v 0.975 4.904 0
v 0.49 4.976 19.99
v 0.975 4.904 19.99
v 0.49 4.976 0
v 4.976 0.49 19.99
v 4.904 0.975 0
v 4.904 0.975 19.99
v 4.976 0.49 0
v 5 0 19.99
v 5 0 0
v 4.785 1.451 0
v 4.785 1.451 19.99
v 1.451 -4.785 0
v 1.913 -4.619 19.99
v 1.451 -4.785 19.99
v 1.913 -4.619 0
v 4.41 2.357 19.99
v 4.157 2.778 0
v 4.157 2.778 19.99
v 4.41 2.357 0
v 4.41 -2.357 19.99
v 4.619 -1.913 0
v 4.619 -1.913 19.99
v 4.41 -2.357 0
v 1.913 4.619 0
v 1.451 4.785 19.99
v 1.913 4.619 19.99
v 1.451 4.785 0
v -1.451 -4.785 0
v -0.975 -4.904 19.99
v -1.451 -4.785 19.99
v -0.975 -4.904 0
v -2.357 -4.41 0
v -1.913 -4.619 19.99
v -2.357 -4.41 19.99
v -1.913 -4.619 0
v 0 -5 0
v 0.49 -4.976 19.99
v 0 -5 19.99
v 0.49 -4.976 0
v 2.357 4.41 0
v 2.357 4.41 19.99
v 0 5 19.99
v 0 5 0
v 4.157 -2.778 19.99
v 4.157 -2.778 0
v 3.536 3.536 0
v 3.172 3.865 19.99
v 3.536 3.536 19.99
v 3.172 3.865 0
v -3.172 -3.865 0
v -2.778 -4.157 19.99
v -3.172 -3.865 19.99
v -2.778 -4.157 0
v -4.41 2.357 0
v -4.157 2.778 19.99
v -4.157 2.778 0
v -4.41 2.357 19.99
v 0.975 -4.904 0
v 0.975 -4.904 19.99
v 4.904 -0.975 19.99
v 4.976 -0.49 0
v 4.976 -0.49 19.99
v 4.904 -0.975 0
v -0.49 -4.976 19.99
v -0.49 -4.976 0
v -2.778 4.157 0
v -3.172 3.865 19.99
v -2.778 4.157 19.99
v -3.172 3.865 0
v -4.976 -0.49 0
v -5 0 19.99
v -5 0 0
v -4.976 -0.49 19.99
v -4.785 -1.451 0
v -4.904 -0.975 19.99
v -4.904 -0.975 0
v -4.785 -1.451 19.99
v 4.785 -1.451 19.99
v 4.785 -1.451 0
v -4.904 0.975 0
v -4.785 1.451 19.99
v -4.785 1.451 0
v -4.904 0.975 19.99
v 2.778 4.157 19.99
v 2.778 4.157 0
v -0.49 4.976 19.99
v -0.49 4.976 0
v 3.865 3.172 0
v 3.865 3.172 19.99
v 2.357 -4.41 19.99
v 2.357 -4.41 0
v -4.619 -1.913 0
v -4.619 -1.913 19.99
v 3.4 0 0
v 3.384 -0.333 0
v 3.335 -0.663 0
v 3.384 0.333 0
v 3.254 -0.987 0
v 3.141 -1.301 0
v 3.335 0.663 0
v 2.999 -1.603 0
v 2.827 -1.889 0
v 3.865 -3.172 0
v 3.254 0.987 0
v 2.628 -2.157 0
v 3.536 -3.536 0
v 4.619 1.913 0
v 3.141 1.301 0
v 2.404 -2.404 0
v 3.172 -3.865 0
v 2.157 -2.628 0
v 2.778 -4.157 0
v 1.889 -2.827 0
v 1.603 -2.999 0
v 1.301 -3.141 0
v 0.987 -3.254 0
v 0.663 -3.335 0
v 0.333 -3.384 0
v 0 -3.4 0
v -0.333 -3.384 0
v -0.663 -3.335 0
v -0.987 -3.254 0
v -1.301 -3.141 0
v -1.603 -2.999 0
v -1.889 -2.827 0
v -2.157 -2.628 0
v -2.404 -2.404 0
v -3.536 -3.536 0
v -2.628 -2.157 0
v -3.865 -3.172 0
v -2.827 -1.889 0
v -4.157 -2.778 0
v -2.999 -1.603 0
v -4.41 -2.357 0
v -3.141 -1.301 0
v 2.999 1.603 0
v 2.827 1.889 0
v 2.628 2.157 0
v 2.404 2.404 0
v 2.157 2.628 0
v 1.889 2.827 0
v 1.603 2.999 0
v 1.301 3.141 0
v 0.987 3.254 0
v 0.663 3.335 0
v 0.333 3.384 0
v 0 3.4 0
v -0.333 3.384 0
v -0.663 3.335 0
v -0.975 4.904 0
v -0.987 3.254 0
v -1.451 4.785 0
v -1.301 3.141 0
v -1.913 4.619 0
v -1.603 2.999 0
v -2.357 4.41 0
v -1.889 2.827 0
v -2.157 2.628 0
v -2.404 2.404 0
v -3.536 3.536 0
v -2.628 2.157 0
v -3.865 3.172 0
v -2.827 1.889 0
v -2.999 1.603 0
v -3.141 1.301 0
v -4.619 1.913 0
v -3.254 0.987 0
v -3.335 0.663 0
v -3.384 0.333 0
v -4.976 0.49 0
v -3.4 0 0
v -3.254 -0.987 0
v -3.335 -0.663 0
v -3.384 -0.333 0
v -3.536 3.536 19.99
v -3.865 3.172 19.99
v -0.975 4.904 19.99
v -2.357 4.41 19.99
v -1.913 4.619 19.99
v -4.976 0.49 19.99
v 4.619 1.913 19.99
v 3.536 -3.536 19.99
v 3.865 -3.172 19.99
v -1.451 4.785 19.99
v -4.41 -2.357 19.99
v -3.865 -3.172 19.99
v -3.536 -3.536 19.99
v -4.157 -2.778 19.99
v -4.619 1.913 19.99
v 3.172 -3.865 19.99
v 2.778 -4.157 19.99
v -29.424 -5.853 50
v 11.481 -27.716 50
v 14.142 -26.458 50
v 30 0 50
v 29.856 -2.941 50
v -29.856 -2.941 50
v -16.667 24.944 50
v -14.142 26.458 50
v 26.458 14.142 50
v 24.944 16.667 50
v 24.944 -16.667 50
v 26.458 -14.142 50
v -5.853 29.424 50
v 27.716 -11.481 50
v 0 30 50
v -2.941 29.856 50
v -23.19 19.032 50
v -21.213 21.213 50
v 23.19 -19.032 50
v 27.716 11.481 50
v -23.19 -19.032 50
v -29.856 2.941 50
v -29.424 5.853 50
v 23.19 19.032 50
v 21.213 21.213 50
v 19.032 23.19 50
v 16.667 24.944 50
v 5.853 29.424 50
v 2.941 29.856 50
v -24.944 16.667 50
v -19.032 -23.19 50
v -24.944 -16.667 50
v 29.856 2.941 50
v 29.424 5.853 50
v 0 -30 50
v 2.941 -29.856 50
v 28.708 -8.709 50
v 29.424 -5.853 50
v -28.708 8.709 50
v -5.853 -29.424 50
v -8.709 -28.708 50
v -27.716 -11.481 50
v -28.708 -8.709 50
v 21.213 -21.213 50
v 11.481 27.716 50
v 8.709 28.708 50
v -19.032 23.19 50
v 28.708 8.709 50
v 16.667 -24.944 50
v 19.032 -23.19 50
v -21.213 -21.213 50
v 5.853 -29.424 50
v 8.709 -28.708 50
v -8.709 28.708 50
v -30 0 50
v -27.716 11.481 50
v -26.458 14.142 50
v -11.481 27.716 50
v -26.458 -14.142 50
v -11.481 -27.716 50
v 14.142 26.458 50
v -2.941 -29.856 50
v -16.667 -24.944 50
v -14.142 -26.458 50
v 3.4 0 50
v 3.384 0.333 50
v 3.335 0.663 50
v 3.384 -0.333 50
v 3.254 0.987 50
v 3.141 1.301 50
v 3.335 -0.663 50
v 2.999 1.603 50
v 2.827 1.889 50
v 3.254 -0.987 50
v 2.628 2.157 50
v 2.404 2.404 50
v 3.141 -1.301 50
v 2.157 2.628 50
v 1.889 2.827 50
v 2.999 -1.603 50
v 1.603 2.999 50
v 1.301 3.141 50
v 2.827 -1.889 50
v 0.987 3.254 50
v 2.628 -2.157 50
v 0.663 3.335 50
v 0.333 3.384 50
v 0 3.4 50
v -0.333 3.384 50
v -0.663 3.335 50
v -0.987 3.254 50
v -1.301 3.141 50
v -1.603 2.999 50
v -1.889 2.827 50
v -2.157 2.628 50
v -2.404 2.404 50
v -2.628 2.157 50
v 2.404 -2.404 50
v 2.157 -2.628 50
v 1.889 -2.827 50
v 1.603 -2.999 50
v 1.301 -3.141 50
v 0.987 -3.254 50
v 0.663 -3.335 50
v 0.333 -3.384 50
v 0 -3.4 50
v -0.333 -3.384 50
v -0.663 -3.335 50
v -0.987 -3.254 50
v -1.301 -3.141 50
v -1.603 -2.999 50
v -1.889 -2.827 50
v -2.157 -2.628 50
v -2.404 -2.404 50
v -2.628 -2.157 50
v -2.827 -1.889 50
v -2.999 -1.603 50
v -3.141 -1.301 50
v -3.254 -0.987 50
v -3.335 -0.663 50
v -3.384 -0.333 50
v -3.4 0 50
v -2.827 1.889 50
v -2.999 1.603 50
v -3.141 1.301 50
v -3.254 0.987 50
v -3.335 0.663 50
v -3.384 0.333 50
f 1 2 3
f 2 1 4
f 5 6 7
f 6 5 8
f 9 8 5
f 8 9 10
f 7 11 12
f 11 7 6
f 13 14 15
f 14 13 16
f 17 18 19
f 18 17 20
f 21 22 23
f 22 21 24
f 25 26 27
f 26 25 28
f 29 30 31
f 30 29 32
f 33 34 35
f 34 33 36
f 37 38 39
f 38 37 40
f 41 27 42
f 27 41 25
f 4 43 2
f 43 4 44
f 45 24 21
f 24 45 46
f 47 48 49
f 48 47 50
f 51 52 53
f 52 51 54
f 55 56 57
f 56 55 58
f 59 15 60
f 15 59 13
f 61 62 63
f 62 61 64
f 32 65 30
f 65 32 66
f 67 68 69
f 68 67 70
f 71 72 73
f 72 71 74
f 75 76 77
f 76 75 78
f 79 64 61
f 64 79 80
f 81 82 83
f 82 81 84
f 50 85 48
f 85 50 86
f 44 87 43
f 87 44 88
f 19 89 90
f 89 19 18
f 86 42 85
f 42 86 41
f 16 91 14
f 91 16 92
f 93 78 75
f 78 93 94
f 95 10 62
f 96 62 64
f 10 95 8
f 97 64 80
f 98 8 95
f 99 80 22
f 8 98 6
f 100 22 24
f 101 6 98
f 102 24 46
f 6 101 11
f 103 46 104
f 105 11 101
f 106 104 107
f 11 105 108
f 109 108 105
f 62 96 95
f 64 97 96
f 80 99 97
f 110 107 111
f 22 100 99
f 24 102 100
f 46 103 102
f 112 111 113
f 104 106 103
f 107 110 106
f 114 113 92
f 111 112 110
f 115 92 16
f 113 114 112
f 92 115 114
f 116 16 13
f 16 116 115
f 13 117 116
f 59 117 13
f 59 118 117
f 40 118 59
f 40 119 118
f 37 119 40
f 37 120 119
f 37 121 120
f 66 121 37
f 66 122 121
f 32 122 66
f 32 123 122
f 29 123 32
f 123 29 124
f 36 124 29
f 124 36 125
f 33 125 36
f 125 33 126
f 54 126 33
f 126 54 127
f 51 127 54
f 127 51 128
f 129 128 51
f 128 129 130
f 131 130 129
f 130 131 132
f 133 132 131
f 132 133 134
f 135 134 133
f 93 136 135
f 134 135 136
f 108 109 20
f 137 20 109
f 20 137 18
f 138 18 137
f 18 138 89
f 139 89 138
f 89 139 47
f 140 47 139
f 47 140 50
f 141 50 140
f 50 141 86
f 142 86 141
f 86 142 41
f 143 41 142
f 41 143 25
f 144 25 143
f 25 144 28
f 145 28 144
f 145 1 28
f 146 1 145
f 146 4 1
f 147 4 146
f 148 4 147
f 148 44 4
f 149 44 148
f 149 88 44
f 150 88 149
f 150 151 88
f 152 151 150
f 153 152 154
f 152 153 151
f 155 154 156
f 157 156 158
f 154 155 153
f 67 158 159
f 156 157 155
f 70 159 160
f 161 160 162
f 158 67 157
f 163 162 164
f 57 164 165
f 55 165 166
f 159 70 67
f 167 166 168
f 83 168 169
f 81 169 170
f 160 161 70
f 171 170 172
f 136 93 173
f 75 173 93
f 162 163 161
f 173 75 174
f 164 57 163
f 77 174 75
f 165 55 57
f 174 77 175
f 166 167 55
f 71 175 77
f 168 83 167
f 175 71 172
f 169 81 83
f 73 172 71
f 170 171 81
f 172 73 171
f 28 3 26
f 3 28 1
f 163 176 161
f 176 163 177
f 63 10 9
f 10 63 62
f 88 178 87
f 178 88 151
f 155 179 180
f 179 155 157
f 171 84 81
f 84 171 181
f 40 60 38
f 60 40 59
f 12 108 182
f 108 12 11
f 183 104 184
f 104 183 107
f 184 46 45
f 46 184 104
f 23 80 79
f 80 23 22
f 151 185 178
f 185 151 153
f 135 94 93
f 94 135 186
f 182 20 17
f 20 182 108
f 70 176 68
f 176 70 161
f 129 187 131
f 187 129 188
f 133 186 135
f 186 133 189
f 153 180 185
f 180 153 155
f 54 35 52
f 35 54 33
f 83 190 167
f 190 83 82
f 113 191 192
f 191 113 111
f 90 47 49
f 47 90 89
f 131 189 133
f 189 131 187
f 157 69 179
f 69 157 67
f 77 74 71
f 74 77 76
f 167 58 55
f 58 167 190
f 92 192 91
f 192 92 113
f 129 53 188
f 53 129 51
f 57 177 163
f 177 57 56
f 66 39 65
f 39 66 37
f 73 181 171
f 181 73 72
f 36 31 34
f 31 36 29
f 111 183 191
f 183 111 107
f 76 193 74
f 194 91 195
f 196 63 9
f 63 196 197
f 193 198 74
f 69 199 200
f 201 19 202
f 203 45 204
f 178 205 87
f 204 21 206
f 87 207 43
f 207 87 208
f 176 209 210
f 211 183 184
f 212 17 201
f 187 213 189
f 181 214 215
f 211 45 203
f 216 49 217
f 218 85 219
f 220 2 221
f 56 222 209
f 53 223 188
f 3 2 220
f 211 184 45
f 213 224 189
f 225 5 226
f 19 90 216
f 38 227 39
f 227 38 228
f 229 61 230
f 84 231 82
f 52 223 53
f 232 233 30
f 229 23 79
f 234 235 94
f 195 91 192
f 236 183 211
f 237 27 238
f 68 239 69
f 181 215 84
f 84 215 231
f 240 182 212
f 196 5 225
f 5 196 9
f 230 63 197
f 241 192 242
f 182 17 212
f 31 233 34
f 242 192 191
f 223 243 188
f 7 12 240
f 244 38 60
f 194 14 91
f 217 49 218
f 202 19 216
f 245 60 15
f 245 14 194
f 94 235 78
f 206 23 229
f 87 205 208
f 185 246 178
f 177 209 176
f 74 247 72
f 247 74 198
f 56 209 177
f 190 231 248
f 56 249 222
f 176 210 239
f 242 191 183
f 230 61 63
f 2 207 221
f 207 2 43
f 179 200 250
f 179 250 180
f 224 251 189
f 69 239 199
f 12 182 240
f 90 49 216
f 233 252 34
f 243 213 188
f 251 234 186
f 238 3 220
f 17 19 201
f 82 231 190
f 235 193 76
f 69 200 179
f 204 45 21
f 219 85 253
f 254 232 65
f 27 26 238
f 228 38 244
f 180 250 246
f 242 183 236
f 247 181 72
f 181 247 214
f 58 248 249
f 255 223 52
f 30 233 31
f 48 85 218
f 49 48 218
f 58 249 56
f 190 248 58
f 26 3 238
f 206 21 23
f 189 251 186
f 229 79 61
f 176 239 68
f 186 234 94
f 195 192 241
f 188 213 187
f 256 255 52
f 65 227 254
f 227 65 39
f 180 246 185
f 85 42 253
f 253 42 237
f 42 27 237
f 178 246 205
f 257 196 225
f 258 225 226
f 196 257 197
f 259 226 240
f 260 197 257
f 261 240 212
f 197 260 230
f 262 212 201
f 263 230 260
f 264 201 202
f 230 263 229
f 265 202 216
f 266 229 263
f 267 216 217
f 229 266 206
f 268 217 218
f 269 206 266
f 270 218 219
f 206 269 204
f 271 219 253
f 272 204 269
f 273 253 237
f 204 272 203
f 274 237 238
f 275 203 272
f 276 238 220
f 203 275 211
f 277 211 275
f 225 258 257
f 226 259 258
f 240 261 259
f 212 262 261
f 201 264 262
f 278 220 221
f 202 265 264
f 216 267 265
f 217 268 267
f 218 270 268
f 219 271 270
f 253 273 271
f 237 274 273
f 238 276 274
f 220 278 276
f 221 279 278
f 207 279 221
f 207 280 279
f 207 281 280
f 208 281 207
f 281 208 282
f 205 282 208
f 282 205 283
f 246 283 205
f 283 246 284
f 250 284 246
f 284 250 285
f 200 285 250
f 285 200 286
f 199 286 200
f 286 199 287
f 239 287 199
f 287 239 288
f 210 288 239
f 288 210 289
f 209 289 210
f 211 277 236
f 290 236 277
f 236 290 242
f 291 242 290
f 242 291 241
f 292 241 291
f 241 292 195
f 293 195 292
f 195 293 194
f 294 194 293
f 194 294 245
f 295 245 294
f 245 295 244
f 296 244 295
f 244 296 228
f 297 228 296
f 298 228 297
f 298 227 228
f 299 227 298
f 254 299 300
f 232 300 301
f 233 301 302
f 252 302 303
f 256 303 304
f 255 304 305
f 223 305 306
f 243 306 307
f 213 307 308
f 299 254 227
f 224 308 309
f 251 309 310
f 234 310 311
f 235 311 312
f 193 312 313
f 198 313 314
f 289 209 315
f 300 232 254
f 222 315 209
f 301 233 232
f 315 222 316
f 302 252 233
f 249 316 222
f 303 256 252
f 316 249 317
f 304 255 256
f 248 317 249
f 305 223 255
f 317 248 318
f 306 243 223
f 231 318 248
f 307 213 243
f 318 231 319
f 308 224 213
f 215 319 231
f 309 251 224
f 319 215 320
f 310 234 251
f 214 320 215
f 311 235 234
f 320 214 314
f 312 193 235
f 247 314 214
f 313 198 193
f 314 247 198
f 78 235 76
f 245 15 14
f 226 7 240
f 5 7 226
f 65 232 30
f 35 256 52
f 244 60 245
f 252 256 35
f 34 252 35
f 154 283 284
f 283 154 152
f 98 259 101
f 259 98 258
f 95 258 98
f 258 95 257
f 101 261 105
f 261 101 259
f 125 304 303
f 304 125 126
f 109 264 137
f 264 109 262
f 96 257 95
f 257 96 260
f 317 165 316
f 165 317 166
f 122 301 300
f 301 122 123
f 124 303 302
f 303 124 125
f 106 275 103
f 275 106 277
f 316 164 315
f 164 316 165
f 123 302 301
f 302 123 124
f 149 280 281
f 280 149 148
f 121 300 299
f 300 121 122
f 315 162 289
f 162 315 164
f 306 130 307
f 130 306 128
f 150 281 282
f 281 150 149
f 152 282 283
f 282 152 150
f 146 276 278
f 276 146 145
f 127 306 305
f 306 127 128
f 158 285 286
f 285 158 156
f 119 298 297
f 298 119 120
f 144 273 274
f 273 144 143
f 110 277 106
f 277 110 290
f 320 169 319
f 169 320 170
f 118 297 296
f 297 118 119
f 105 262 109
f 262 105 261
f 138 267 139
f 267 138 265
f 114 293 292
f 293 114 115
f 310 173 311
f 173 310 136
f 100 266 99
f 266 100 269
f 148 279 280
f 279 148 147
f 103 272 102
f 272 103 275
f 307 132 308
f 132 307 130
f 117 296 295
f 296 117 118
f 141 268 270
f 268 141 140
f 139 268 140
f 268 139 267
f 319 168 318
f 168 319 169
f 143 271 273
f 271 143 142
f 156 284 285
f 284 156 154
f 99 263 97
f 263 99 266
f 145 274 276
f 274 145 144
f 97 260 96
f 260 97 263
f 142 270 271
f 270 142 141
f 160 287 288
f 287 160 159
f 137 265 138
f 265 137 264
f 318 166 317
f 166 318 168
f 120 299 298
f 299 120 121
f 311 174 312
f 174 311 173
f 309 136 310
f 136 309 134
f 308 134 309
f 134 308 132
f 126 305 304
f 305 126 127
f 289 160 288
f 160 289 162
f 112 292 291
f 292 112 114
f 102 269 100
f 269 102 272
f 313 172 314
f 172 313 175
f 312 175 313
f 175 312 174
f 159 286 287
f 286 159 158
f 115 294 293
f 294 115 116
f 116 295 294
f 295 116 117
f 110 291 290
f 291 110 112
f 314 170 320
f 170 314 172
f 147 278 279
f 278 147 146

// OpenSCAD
// Lab funnel - printed upright, wide opening at top
// Units: mm

$fn = 64;

// --- Dimensions ---
spout_od      = 10;   // spout outer diameter
spout_h       = 20;   // spout height (z = 0 to 20)
spout_bore    = 6.8;  // spout bore (od 10, wall 1.6)

cone_od_bottom = 10;  // cone outer diameter at z = 20
cone_od_top    = 60;  // cone outer diameter at rim (z = 50)
cone_h        = 30;   // cone height (z = 20 to 50)

wall          = 1.6;  // wall thickness everywhere

// --- Derived ---
spout_r_out   = spout_od / 2;
spout_r_in    = spout_bore / 2;
cone_r_bottom = cone_od_bottom / 2;
cone_r_top    = cone_od_top / 2;

// --- Model ---
difference() {
    union() {
        // Spout
        cylinder(h = spout_h, r = spout_r_out);

        // Cone (slightly overlapping spout for a clean union)
        translate([0, 0, spout_h - 0.01])
            cylinder(h = cone_h + 0.01, r1 = cone_r_bottom, r2 = cone_r_top);
    }

    // Through-bore from bottom up to rim height
    translate([0, 0, -1])
        cylinder(h = spout_h + cone_h + 2, r = spout_r_in);
}
